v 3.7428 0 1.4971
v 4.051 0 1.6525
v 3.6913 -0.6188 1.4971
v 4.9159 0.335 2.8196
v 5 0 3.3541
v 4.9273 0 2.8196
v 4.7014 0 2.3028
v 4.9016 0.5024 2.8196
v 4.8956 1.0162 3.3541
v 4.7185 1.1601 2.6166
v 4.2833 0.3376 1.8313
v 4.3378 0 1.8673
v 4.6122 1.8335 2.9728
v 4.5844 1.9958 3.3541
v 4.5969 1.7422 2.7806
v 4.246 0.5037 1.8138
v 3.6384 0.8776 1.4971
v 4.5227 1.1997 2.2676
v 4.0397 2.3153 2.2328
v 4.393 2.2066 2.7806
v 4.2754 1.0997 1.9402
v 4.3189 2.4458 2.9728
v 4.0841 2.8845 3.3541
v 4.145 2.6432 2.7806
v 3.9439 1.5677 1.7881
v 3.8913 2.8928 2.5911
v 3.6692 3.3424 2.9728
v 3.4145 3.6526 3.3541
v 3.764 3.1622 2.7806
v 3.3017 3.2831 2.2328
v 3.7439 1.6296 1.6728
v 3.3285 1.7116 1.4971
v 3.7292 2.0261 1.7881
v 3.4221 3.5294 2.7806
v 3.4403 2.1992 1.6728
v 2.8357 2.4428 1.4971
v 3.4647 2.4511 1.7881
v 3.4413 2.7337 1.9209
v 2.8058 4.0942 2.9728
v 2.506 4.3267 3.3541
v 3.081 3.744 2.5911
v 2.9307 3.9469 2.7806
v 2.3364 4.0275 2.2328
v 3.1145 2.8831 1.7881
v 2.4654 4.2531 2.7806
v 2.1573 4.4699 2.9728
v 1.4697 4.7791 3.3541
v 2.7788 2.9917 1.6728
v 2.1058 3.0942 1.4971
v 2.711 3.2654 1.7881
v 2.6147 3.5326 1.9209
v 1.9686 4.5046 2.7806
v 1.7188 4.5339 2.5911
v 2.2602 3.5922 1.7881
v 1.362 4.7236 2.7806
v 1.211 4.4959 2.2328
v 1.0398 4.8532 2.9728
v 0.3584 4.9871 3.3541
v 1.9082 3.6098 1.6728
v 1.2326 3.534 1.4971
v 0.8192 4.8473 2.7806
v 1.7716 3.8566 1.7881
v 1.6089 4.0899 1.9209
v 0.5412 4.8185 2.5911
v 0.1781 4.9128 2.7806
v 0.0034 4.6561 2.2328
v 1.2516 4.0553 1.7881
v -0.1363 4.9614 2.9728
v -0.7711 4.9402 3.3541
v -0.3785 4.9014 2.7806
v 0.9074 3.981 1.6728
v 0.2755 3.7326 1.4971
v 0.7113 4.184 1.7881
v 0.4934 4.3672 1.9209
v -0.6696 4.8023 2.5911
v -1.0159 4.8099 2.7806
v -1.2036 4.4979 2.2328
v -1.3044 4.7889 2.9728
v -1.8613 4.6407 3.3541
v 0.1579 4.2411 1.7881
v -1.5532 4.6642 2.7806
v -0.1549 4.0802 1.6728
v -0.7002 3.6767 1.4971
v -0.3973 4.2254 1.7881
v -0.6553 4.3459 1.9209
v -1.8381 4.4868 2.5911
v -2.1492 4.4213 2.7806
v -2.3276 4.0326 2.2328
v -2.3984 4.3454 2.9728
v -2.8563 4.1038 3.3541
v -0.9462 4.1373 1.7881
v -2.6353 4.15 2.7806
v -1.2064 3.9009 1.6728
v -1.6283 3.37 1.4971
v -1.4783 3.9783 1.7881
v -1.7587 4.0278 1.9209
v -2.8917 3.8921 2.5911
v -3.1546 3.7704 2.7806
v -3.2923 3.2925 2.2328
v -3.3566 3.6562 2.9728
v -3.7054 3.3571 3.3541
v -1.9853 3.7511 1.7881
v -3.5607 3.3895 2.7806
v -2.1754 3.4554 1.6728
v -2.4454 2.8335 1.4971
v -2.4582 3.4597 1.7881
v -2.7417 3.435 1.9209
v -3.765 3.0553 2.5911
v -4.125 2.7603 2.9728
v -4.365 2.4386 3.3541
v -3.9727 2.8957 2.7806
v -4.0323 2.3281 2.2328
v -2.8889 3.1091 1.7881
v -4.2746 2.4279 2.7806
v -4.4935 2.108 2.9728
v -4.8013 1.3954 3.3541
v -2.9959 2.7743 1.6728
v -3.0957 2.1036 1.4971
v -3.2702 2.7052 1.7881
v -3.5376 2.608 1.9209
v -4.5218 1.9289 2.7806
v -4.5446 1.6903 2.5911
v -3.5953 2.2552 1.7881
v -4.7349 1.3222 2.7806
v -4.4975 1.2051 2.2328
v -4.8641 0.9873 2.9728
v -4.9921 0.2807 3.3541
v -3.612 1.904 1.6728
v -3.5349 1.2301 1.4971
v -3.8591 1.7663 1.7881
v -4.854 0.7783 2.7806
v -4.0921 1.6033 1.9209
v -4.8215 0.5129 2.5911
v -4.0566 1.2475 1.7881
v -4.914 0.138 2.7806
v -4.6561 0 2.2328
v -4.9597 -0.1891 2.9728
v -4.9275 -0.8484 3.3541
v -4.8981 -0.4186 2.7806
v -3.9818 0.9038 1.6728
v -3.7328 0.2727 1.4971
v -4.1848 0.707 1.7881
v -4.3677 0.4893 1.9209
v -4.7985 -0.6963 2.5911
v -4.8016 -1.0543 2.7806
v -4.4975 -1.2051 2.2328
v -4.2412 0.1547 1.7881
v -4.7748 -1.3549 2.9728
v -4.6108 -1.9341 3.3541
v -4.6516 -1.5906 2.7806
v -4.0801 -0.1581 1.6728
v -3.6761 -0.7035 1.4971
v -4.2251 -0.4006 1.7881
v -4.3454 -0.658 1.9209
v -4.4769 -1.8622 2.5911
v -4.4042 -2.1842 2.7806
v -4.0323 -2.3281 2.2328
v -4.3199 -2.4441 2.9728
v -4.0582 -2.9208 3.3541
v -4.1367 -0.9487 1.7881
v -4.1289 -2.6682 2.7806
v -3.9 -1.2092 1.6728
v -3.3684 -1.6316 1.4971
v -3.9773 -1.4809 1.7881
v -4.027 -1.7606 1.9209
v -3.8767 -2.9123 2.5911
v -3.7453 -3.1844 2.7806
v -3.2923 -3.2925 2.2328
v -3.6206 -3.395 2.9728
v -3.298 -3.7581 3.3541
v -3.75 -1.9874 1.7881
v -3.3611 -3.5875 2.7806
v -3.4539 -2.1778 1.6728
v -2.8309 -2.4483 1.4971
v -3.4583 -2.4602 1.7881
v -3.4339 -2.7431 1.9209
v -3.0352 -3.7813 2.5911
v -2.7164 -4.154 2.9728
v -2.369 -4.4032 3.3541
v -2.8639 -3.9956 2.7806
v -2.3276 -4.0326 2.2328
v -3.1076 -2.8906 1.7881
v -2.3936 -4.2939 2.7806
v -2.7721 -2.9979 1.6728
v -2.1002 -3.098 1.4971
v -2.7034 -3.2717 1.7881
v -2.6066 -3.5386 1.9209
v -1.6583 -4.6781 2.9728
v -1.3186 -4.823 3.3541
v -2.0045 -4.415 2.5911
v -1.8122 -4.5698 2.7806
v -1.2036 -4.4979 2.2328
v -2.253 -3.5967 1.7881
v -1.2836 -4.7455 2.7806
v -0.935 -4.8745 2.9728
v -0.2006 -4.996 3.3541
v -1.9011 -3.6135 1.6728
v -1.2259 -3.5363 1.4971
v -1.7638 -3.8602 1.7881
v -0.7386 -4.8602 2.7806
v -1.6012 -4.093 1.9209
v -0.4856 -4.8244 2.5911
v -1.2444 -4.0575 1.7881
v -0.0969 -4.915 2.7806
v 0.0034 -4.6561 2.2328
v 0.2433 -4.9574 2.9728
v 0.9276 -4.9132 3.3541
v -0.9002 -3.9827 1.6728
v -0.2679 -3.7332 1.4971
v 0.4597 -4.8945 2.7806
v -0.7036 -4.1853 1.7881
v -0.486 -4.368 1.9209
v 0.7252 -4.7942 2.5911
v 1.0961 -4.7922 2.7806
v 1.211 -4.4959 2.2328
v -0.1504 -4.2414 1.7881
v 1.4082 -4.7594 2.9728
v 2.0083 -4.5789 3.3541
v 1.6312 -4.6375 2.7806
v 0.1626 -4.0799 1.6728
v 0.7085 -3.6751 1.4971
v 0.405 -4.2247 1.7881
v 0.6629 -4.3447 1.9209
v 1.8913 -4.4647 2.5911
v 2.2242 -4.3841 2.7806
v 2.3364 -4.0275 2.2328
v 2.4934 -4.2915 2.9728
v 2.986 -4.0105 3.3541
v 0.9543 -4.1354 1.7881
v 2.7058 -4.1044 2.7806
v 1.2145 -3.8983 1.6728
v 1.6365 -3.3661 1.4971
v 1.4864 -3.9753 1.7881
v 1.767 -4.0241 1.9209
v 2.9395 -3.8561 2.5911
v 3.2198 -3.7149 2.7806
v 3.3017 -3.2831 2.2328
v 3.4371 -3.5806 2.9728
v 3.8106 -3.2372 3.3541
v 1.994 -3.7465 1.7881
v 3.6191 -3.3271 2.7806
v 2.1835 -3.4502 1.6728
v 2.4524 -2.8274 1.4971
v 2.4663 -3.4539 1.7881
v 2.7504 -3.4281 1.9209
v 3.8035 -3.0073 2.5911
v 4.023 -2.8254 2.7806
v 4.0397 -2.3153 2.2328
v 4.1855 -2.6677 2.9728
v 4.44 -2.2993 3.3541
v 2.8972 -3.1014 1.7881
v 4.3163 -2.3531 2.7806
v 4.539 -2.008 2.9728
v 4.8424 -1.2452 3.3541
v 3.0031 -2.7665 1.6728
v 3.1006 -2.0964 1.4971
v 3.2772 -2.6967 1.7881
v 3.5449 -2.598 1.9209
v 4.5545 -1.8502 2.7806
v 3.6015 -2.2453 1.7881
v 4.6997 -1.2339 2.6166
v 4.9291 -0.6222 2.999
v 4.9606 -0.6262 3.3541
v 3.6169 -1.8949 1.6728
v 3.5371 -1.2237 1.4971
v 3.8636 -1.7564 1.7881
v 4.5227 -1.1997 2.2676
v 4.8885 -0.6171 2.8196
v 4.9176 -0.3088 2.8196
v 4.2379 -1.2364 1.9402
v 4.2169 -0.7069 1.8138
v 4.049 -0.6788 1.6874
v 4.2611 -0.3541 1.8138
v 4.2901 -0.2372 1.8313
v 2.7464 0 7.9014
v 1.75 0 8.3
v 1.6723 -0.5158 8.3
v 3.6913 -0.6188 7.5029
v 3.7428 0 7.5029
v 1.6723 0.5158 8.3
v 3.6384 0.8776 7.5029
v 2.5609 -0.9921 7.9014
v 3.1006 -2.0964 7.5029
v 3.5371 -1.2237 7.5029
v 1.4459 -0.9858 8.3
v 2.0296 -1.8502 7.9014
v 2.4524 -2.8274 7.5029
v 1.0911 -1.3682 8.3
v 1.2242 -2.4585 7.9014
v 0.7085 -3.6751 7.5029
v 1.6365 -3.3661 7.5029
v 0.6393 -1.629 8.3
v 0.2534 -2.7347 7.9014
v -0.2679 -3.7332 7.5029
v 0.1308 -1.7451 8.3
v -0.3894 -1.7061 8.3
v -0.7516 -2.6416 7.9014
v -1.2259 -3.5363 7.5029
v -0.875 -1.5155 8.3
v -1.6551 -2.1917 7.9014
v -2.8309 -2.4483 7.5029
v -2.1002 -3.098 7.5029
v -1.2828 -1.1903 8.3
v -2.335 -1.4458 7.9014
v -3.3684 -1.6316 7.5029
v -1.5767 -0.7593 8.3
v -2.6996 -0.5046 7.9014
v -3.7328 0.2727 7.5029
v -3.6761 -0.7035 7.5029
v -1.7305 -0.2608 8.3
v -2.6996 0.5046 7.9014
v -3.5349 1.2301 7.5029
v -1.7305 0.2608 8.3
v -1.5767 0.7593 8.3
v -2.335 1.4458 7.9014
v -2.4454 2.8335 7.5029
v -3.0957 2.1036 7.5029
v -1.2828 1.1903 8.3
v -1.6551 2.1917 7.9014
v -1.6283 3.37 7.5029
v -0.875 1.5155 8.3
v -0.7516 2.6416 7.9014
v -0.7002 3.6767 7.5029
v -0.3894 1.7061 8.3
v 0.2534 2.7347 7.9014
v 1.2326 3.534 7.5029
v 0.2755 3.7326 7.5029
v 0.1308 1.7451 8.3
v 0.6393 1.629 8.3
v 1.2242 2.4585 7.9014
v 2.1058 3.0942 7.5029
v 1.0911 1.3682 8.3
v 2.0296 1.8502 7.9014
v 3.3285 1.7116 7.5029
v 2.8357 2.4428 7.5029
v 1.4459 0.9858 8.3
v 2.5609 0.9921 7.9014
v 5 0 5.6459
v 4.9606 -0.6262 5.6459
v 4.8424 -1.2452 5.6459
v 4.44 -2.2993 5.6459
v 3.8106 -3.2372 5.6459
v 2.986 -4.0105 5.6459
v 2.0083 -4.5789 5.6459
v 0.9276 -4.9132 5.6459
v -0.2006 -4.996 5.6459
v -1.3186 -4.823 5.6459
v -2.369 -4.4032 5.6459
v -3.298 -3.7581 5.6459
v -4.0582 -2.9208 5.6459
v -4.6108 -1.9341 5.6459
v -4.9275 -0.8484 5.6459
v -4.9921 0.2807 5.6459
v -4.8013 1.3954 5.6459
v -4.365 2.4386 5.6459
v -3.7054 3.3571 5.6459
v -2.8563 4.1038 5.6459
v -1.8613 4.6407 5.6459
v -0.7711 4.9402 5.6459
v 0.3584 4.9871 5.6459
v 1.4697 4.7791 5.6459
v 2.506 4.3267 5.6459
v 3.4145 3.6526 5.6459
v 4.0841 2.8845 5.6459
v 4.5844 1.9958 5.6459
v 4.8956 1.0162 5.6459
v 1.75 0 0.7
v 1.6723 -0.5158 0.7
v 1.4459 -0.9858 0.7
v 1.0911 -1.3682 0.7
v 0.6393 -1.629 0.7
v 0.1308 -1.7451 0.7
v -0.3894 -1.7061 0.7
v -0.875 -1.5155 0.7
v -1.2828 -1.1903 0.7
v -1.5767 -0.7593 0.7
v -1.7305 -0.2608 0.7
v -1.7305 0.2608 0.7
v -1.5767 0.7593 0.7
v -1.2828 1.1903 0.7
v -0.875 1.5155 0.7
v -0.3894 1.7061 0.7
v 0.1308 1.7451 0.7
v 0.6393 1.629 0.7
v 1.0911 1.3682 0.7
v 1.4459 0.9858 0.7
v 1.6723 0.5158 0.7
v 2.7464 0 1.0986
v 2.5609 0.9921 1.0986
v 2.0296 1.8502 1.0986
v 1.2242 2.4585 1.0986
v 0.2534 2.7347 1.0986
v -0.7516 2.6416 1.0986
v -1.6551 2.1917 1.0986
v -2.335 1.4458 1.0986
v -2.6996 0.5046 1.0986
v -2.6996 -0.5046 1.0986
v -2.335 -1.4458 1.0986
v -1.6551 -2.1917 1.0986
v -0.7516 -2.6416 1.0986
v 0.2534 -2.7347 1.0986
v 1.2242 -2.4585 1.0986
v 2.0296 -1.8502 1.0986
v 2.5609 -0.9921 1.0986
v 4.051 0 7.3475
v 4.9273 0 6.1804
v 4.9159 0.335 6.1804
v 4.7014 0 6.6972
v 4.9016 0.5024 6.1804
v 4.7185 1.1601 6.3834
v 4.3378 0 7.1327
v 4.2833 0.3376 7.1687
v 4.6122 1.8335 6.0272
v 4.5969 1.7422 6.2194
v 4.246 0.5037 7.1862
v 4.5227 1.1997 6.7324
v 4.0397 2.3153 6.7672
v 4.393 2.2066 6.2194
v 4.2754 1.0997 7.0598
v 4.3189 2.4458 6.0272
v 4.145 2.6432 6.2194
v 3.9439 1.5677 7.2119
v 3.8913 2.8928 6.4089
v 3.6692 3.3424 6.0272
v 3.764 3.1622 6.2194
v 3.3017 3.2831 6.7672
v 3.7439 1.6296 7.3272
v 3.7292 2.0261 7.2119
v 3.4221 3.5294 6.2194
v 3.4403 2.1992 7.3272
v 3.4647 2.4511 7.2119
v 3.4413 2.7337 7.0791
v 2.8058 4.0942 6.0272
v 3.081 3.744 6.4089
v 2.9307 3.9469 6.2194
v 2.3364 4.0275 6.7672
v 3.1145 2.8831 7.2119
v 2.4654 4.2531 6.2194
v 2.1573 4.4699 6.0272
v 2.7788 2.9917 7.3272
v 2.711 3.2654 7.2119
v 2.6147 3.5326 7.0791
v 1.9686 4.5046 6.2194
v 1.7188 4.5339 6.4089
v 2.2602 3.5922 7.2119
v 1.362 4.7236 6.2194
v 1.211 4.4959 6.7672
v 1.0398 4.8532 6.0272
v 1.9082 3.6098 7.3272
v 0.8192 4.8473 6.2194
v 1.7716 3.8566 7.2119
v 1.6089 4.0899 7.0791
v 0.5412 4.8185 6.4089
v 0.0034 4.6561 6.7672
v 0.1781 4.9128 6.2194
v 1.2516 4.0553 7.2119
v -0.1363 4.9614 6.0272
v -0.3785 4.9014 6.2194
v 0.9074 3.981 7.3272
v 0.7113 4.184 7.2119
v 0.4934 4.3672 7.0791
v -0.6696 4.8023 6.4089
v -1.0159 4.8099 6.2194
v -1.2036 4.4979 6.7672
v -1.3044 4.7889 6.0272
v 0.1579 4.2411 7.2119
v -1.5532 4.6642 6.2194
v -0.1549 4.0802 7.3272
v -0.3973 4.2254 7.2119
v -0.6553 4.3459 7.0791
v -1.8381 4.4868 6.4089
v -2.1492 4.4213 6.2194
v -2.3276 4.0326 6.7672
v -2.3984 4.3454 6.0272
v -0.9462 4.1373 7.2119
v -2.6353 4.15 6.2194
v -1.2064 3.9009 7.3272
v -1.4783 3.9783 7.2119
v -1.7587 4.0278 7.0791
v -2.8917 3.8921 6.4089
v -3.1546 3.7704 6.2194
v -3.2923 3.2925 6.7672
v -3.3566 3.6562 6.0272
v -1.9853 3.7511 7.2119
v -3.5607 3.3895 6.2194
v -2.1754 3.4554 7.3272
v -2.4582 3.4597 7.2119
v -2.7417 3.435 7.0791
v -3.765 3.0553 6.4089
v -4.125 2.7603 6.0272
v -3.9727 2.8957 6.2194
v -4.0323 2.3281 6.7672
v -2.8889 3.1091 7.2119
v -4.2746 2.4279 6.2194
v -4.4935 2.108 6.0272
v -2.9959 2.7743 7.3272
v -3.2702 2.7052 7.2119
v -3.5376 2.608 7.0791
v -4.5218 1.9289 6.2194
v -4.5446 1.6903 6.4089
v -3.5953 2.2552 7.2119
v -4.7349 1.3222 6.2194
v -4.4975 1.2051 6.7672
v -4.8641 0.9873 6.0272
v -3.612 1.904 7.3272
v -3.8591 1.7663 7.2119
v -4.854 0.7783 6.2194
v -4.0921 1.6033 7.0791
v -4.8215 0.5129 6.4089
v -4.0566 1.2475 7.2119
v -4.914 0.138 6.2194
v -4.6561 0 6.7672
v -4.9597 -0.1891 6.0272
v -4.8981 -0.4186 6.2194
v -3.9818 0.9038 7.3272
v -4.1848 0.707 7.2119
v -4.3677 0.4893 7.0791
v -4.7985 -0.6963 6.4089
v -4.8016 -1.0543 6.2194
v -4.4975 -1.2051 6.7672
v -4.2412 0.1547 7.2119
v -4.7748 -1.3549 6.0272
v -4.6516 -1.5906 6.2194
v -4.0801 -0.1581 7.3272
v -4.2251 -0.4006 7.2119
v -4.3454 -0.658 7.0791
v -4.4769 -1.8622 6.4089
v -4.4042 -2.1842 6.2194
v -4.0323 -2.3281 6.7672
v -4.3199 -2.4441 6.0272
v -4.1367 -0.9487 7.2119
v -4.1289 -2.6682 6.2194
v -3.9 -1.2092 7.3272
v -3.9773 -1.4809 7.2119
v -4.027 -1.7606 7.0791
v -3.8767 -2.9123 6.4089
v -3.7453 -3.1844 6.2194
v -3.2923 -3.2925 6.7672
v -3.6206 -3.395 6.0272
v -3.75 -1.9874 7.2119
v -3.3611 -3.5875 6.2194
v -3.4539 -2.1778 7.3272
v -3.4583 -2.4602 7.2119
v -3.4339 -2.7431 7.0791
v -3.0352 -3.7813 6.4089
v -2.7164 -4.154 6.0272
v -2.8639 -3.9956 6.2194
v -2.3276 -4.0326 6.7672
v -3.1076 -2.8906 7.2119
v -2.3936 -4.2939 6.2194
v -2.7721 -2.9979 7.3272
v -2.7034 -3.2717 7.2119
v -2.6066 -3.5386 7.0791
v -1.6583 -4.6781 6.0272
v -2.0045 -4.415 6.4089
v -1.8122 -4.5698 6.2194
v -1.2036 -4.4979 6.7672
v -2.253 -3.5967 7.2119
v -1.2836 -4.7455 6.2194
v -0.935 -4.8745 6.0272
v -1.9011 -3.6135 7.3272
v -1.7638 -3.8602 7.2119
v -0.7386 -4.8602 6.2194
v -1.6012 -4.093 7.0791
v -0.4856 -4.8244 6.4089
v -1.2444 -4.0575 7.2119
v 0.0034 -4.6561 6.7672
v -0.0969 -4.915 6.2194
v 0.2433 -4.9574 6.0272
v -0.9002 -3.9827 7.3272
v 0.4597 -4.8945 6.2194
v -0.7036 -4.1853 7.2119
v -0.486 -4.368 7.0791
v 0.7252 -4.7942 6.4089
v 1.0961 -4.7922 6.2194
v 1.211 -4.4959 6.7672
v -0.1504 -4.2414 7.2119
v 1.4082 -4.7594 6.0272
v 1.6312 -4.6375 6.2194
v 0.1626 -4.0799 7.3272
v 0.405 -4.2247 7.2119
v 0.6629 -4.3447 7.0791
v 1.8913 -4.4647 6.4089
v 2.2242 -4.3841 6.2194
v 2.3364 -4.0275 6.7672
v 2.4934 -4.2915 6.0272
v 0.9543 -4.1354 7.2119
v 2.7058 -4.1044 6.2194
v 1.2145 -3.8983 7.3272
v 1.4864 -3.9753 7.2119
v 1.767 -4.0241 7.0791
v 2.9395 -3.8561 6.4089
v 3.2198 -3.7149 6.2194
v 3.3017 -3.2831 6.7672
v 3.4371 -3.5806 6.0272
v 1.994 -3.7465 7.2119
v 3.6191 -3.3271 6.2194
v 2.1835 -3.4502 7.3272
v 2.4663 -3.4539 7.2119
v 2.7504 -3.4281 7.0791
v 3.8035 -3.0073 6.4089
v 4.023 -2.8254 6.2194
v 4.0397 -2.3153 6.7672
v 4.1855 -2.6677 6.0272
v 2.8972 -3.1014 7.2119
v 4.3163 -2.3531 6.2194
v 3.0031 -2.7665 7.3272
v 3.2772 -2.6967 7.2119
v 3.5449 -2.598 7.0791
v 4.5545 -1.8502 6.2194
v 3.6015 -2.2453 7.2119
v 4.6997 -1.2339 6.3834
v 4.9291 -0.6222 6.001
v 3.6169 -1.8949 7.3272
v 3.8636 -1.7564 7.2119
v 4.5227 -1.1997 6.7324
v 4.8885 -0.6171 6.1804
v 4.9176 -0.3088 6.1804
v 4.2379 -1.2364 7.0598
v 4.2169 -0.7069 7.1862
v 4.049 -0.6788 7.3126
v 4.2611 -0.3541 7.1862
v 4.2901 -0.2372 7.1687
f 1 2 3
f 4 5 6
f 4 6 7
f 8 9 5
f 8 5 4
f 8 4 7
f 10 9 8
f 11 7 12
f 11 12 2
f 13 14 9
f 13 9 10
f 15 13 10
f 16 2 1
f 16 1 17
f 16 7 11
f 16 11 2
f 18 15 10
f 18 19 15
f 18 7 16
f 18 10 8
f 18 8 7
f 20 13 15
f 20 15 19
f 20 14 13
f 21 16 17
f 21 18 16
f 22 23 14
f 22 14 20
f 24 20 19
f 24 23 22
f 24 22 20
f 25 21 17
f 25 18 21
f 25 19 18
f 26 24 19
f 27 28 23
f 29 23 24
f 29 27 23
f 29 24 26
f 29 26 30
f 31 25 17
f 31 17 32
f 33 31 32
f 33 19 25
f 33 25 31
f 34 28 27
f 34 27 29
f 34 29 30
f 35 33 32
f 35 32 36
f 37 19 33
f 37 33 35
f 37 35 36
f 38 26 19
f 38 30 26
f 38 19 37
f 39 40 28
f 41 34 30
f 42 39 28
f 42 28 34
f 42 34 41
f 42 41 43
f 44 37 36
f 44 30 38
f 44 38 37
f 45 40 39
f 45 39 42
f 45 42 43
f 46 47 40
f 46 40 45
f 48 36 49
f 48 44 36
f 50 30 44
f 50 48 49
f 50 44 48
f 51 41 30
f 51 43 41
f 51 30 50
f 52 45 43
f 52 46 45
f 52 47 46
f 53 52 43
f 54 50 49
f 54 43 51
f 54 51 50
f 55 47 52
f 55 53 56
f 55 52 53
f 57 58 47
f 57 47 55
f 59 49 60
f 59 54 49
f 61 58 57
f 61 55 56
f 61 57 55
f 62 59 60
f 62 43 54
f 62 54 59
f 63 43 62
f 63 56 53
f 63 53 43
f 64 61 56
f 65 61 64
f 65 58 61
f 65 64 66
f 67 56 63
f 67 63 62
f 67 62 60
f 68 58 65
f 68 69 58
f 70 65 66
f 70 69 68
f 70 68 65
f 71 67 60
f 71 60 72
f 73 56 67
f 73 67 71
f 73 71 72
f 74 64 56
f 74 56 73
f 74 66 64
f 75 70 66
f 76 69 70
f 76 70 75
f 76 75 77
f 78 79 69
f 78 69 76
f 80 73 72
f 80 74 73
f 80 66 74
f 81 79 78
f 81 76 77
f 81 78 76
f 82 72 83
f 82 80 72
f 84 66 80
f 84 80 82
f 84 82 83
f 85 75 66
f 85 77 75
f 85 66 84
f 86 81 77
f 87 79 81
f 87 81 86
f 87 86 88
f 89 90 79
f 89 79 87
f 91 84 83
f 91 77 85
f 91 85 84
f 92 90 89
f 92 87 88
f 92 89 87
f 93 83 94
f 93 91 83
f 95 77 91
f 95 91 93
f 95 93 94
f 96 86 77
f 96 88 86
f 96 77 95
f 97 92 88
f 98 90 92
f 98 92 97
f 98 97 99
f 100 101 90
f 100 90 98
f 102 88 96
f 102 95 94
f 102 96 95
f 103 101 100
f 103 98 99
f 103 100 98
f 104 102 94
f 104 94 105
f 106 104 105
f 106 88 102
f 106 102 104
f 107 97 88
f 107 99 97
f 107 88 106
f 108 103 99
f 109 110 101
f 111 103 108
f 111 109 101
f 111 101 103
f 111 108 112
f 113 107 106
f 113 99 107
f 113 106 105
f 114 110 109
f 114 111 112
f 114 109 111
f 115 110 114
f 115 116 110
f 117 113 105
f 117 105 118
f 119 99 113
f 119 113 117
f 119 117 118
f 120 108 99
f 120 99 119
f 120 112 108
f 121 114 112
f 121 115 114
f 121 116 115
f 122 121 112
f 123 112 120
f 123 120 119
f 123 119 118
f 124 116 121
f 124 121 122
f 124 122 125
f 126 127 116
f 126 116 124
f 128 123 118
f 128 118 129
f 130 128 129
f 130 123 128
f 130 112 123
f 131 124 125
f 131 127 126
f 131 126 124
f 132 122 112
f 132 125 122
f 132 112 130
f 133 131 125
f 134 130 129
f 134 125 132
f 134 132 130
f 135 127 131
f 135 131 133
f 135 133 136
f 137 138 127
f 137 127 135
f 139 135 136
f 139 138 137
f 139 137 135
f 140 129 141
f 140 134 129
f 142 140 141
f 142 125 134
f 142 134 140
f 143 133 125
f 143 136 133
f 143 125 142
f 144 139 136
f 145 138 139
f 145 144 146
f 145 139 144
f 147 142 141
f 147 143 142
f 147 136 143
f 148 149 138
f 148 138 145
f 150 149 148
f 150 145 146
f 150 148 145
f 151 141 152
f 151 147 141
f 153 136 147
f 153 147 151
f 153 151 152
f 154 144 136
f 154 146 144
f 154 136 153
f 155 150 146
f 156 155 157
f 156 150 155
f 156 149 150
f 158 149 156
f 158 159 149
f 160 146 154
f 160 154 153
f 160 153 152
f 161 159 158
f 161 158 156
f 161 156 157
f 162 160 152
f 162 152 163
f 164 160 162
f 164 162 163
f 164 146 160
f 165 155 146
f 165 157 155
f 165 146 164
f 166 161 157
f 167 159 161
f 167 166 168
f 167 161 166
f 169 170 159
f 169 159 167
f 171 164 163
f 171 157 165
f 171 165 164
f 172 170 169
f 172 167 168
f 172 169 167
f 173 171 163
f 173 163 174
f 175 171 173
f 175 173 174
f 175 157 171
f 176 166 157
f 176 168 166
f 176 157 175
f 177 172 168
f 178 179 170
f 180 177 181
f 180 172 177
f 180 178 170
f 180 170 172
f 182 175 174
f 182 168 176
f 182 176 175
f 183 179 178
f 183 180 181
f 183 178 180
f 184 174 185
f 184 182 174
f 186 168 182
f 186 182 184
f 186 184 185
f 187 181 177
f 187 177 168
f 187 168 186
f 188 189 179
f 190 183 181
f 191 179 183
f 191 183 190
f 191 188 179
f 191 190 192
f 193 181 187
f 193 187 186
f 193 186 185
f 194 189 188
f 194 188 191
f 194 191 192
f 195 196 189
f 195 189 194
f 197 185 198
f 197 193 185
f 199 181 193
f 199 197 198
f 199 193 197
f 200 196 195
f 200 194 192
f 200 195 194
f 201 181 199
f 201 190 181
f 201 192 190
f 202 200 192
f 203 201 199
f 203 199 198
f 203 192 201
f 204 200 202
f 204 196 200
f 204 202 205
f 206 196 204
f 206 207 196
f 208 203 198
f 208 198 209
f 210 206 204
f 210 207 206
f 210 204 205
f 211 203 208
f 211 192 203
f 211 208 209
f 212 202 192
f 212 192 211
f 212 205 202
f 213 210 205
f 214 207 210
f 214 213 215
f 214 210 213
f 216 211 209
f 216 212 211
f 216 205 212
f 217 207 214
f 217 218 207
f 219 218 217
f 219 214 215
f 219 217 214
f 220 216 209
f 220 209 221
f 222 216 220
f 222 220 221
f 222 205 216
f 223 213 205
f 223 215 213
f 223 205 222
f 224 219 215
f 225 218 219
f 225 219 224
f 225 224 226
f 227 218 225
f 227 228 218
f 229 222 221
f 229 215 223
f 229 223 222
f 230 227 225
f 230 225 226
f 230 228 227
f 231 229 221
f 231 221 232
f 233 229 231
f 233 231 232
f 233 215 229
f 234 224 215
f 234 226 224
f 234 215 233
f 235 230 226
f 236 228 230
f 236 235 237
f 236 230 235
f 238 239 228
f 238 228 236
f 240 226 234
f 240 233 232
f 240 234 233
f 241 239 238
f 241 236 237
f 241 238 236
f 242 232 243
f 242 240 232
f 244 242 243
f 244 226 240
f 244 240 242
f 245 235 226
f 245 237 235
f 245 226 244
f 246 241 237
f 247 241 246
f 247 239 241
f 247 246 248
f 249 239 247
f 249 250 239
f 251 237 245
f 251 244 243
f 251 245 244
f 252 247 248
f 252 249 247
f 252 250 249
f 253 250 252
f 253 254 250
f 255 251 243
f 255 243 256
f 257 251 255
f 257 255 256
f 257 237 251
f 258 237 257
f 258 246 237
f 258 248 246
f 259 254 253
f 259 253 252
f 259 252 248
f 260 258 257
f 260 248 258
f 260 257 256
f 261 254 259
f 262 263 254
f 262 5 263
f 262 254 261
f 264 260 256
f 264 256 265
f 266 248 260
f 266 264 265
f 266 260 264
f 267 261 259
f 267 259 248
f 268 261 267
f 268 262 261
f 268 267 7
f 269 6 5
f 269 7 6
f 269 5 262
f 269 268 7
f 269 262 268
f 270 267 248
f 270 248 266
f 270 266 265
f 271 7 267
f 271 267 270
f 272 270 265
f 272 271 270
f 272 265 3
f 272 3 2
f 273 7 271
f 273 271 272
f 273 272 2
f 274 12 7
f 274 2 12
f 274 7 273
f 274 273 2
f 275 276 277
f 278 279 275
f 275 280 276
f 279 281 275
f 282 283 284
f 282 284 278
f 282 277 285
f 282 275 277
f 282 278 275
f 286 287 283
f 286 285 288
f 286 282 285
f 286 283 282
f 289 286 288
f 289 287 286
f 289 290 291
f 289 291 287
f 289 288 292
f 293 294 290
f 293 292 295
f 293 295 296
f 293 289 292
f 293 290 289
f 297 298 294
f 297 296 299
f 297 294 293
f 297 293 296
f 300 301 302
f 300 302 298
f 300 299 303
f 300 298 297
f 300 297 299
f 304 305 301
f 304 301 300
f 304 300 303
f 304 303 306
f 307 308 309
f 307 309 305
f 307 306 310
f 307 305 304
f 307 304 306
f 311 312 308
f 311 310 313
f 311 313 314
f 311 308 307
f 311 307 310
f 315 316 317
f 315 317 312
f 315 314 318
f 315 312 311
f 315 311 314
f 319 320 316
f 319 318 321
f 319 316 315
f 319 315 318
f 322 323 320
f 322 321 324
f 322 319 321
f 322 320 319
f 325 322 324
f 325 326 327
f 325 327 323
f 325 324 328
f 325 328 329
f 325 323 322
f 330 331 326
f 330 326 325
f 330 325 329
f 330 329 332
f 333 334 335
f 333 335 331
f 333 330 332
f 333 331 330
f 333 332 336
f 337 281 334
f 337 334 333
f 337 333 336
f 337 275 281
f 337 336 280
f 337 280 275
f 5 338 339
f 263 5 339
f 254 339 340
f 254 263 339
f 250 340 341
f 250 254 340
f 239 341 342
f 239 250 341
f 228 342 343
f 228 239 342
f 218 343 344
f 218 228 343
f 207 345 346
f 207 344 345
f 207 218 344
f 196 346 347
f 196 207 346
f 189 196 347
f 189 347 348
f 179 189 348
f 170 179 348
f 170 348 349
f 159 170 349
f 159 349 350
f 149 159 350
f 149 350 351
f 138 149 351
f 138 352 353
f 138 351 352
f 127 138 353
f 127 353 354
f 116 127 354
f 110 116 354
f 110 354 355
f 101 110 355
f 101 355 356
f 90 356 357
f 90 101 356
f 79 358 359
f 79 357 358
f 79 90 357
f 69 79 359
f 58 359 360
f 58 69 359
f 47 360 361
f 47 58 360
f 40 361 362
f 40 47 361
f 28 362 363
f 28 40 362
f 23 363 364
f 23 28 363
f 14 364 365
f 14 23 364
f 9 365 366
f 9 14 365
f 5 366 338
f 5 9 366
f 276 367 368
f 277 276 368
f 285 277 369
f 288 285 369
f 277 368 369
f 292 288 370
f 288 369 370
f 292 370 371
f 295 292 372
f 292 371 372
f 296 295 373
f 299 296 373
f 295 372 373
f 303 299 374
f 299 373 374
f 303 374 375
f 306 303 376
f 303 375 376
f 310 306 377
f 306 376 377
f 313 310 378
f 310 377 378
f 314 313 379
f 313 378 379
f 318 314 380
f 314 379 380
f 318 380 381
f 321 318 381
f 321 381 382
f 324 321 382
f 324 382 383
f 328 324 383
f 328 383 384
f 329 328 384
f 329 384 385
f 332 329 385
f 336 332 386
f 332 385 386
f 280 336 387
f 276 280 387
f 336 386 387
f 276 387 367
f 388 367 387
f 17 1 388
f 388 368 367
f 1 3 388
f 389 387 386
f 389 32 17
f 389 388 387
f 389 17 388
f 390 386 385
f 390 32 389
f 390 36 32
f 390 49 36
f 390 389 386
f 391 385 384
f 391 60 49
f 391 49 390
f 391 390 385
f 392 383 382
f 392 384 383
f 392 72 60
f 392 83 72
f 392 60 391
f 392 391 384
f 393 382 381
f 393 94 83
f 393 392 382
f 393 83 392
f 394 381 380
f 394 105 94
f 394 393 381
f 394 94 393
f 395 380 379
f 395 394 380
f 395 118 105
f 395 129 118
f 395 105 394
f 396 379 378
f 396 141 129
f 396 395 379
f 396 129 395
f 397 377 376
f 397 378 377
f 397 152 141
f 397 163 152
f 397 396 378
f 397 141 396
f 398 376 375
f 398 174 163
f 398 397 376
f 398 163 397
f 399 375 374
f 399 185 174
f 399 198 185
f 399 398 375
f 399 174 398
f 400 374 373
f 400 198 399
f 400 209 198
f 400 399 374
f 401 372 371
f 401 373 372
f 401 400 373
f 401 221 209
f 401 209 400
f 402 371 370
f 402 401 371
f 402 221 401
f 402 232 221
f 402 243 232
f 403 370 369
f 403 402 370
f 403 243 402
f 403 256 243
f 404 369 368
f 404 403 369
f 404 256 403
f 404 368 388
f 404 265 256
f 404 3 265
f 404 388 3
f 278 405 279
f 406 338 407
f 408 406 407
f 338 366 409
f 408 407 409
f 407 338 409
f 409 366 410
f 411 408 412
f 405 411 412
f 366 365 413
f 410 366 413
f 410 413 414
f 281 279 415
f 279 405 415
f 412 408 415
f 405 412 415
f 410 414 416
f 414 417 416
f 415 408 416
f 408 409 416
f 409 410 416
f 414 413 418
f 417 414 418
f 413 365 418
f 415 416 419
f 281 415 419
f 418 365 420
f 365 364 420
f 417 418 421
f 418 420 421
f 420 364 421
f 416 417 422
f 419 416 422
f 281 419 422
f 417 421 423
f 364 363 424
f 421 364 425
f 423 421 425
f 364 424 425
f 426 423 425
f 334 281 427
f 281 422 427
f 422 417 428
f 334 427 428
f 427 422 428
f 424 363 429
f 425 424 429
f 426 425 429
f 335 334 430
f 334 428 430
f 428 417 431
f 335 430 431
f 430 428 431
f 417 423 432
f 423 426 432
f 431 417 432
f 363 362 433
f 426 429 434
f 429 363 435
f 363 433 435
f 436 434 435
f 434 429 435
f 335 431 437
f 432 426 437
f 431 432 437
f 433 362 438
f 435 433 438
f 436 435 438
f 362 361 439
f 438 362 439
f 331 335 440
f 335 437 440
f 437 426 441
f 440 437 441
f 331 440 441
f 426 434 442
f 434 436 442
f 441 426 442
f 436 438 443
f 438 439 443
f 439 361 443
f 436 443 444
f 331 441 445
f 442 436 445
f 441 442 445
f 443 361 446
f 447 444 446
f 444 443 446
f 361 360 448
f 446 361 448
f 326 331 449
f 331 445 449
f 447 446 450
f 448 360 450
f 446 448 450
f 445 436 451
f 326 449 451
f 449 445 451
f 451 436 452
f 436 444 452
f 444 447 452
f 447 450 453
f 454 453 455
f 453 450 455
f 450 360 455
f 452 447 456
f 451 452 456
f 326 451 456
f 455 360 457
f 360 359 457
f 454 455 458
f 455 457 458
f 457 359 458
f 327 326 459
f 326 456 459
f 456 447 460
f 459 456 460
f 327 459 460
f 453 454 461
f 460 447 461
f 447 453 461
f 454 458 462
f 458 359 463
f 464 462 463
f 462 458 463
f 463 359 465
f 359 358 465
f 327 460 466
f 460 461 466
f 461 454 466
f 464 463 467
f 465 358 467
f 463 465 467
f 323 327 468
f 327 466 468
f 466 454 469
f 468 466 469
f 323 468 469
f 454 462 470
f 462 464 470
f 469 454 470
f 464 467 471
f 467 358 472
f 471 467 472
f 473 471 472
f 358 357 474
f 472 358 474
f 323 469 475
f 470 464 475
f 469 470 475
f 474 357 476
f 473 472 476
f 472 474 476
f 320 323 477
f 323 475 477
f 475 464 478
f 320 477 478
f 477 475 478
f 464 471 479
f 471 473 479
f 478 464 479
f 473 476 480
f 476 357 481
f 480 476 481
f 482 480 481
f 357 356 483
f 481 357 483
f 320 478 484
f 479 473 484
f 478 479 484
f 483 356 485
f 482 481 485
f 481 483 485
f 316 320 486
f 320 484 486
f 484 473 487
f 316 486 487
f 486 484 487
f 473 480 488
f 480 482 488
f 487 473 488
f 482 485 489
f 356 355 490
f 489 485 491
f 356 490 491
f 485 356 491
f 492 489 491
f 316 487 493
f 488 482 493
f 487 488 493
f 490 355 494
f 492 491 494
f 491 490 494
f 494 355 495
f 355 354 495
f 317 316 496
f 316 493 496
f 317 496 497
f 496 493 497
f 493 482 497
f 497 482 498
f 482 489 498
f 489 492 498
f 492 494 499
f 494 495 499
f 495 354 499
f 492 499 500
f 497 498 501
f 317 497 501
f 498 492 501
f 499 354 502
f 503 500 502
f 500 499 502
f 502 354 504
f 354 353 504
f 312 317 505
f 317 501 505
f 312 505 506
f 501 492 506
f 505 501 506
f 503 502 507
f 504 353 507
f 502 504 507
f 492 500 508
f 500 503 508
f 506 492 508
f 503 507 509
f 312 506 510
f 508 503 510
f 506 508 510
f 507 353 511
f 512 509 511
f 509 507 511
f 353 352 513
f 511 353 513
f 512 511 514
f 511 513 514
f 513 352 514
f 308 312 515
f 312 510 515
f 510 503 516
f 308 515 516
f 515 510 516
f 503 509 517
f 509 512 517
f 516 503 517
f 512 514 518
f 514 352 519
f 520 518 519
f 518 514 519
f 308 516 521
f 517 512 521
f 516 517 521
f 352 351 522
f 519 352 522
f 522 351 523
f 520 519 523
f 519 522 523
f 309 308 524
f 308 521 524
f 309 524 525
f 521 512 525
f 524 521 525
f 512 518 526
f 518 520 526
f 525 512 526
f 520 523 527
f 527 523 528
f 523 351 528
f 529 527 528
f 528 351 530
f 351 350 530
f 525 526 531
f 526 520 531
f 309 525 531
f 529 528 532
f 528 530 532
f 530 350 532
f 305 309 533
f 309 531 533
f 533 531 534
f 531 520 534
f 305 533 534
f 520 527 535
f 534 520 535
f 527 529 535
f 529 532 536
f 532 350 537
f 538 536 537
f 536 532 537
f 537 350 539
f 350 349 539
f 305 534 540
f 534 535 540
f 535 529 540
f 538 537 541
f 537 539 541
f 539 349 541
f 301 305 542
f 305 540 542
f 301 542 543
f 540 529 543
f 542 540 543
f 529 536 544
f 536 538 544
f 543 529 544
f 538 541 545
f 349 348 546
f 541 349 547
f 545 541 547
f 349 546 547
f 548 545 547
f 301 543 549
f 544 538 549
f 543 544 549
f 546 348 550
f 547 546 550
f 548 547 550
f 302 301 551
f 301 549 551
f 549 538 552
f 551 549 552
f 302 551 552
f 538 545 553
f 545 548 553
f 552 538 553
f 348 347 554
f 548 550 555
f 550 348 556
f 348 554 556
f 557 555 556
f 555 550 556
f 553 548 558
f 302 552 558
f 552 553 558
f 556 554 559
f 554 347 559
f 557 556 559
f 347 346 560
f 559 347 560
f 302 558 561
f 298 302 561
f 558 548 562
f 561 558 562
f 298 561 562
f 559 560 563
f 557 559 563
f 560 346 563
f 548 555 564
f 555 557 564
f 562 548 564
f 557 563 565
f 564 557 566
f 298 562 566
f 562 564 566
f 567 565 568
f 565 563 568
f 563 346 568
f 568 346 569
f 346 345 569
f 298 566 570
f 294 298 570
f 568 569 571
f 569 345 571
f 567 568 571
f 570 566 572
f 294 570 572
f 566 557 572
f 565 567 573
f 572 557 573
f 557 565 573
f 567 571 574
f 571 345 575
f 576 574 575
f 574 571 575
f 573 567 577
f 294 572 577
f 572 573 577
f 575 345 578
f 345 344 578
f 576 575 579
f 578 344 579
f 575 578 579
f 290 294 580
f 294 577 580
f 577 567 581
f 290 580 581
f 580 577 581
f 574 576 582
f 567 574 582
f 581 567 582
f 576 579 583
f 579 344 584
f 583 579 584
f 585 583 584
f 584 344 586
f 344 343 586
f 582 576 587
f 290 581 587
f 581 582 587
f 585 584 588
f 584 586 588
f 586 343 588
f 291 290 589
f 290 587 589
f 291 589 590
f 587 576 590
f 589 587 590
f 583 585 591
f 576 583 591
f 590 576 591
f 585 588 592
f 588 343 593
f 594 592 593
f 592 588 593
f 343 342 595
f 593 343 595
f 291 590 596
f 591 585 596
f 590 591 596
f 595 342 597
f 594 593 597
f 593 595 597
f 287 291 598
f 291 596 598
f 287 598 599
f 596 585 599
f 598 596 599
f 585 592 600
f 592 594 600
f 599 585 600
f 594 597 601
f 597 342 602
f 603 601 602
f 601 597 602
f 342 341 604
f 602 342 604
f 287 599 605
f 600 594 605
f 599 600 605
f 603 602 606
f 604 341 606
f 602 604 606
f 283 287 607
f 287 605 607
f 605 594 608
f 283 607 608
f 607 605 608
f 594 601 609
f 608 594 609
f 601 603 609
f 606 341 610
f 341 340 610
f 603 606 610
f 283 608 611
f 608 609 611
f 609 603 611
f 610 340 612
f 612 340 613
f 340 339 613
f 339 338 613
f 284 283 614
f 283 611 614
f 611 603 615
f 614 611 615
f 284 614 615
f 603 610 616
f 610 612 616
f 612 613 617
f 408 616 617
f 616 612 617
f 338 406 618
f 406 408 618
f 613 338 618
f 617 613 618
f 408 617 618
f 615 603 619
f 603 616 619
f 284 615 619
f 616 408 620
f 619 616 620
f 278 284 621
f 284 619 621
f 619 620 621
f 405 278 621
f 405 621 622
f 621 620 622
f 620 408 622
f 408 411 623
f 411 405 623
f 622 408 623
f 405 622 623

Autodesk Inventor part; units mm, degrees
ref_plane "YZ Plane" through (0, 0, 0) normal (1, 0, 0) x (0, 1, 0)
ref_plane "XZ Plane" through (0, 0, 0) normal (0, 1, 0) x (-1, 0, 0)
ref_plane "XY Plane" through (0, 0, 0) normal (0, 0, 1) x (1, 0, 0)
sketch "Sketch1" plane through (0, 0, 0) normal (0, 0, 1) x (1, 0, 0)
  circle A0 centre (0, 0) radius 5
  dimension "d0" = 10
extrude "Extrusion1" add sketch "Sketch1" along normal blind 9
chamfer "Chamfer1" distance 5 distance2 2 1 edges at (-5, 0, 9) measured on face at (-0.591, 1.5584, 9)
chamfer "Chamfer2" distance 2 distance2 5 1 edges at (-5, 0, 0) measured on face at (4.9838, -0.4023, 4.6667)
sketch "Sketch3" plane through (0, 0, 0) normal (0, 0, 1) x (1, 0, 0)
  circle A0 centre (0, 0) radius 1.75
  dimension "d11" = 3.5
extrude "Extrusion2" cut sketch "Sketch3" along normal blind 10
fillet "Fillet1" radius 2 2 edges at (-5, 0, 2) (-5, 0, 7)
properties part number "KoloPrzegubu"
